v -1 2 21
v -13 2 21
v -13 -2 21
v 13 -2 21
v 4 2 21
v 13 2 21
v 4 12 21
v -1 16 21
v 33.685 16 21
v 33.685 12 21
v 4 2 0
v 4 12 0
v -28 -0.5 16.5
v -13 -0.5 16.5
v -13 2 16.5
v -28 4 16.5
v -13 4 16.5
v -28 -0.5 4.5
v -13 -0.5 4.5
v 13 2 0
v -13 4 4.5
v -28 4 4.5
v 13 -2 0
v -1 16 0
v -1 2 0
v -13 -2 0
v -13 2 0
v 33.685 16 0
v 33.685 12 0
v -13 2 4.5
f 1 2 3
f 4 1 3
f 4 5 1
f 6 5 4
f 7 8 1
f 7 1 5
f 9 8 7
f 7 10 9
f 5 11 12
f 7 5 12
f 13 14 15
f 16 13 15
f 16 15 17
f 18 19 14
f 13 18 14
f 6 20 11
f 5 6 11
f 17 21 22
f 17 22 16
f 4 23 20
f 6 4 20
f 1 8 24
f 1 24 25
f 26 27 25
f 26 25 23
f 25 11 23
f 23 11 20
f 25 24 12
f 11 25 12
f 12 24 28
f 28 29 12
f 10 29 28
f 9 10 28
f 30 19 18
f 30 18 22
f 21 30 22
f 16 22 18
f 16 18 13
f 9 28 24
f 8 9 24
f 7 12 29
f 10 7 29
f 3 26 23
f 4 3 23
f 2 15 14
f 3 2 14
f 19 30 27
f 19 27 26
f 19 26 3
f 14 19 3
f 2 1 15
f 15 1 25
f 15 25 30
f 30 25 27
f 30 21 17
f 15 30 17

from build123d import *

# Parameters (mm, degrees)
BOSS_EXTRUDE2_DEPTH = 21
SKETCH2_W           = 12
SKETCH2_H           = 4.5
BOSS_EXTRUDE3_DEPTH = 15


with BuildPart() as part:
    # Sketch1 → Boss-Extrude2 (new body)
    with BuildSketch(Plane.XY):
        Polygon((4, 2), (4, 12), (33.684729064, 12), (33.684729064, 16), (-1, 16), (-1, 2), (-13, 2), (-13, -2), (13, -2), (13, 2), align=None)
    extrude(amount=BOSS_EXTRUDE2_DEPTH)

    # Sketch2 → Boss-Extrude3 (add)
    with BuildSketch(Plane.ZY.offset(13)):
        with Locations((10.5, 1.75)):
            Rectangle(SKETCH2_W, SKETCH2_H)
    extrude(amount=BOSS_EXTRUDE3_DEPTH)


solid = part.part
